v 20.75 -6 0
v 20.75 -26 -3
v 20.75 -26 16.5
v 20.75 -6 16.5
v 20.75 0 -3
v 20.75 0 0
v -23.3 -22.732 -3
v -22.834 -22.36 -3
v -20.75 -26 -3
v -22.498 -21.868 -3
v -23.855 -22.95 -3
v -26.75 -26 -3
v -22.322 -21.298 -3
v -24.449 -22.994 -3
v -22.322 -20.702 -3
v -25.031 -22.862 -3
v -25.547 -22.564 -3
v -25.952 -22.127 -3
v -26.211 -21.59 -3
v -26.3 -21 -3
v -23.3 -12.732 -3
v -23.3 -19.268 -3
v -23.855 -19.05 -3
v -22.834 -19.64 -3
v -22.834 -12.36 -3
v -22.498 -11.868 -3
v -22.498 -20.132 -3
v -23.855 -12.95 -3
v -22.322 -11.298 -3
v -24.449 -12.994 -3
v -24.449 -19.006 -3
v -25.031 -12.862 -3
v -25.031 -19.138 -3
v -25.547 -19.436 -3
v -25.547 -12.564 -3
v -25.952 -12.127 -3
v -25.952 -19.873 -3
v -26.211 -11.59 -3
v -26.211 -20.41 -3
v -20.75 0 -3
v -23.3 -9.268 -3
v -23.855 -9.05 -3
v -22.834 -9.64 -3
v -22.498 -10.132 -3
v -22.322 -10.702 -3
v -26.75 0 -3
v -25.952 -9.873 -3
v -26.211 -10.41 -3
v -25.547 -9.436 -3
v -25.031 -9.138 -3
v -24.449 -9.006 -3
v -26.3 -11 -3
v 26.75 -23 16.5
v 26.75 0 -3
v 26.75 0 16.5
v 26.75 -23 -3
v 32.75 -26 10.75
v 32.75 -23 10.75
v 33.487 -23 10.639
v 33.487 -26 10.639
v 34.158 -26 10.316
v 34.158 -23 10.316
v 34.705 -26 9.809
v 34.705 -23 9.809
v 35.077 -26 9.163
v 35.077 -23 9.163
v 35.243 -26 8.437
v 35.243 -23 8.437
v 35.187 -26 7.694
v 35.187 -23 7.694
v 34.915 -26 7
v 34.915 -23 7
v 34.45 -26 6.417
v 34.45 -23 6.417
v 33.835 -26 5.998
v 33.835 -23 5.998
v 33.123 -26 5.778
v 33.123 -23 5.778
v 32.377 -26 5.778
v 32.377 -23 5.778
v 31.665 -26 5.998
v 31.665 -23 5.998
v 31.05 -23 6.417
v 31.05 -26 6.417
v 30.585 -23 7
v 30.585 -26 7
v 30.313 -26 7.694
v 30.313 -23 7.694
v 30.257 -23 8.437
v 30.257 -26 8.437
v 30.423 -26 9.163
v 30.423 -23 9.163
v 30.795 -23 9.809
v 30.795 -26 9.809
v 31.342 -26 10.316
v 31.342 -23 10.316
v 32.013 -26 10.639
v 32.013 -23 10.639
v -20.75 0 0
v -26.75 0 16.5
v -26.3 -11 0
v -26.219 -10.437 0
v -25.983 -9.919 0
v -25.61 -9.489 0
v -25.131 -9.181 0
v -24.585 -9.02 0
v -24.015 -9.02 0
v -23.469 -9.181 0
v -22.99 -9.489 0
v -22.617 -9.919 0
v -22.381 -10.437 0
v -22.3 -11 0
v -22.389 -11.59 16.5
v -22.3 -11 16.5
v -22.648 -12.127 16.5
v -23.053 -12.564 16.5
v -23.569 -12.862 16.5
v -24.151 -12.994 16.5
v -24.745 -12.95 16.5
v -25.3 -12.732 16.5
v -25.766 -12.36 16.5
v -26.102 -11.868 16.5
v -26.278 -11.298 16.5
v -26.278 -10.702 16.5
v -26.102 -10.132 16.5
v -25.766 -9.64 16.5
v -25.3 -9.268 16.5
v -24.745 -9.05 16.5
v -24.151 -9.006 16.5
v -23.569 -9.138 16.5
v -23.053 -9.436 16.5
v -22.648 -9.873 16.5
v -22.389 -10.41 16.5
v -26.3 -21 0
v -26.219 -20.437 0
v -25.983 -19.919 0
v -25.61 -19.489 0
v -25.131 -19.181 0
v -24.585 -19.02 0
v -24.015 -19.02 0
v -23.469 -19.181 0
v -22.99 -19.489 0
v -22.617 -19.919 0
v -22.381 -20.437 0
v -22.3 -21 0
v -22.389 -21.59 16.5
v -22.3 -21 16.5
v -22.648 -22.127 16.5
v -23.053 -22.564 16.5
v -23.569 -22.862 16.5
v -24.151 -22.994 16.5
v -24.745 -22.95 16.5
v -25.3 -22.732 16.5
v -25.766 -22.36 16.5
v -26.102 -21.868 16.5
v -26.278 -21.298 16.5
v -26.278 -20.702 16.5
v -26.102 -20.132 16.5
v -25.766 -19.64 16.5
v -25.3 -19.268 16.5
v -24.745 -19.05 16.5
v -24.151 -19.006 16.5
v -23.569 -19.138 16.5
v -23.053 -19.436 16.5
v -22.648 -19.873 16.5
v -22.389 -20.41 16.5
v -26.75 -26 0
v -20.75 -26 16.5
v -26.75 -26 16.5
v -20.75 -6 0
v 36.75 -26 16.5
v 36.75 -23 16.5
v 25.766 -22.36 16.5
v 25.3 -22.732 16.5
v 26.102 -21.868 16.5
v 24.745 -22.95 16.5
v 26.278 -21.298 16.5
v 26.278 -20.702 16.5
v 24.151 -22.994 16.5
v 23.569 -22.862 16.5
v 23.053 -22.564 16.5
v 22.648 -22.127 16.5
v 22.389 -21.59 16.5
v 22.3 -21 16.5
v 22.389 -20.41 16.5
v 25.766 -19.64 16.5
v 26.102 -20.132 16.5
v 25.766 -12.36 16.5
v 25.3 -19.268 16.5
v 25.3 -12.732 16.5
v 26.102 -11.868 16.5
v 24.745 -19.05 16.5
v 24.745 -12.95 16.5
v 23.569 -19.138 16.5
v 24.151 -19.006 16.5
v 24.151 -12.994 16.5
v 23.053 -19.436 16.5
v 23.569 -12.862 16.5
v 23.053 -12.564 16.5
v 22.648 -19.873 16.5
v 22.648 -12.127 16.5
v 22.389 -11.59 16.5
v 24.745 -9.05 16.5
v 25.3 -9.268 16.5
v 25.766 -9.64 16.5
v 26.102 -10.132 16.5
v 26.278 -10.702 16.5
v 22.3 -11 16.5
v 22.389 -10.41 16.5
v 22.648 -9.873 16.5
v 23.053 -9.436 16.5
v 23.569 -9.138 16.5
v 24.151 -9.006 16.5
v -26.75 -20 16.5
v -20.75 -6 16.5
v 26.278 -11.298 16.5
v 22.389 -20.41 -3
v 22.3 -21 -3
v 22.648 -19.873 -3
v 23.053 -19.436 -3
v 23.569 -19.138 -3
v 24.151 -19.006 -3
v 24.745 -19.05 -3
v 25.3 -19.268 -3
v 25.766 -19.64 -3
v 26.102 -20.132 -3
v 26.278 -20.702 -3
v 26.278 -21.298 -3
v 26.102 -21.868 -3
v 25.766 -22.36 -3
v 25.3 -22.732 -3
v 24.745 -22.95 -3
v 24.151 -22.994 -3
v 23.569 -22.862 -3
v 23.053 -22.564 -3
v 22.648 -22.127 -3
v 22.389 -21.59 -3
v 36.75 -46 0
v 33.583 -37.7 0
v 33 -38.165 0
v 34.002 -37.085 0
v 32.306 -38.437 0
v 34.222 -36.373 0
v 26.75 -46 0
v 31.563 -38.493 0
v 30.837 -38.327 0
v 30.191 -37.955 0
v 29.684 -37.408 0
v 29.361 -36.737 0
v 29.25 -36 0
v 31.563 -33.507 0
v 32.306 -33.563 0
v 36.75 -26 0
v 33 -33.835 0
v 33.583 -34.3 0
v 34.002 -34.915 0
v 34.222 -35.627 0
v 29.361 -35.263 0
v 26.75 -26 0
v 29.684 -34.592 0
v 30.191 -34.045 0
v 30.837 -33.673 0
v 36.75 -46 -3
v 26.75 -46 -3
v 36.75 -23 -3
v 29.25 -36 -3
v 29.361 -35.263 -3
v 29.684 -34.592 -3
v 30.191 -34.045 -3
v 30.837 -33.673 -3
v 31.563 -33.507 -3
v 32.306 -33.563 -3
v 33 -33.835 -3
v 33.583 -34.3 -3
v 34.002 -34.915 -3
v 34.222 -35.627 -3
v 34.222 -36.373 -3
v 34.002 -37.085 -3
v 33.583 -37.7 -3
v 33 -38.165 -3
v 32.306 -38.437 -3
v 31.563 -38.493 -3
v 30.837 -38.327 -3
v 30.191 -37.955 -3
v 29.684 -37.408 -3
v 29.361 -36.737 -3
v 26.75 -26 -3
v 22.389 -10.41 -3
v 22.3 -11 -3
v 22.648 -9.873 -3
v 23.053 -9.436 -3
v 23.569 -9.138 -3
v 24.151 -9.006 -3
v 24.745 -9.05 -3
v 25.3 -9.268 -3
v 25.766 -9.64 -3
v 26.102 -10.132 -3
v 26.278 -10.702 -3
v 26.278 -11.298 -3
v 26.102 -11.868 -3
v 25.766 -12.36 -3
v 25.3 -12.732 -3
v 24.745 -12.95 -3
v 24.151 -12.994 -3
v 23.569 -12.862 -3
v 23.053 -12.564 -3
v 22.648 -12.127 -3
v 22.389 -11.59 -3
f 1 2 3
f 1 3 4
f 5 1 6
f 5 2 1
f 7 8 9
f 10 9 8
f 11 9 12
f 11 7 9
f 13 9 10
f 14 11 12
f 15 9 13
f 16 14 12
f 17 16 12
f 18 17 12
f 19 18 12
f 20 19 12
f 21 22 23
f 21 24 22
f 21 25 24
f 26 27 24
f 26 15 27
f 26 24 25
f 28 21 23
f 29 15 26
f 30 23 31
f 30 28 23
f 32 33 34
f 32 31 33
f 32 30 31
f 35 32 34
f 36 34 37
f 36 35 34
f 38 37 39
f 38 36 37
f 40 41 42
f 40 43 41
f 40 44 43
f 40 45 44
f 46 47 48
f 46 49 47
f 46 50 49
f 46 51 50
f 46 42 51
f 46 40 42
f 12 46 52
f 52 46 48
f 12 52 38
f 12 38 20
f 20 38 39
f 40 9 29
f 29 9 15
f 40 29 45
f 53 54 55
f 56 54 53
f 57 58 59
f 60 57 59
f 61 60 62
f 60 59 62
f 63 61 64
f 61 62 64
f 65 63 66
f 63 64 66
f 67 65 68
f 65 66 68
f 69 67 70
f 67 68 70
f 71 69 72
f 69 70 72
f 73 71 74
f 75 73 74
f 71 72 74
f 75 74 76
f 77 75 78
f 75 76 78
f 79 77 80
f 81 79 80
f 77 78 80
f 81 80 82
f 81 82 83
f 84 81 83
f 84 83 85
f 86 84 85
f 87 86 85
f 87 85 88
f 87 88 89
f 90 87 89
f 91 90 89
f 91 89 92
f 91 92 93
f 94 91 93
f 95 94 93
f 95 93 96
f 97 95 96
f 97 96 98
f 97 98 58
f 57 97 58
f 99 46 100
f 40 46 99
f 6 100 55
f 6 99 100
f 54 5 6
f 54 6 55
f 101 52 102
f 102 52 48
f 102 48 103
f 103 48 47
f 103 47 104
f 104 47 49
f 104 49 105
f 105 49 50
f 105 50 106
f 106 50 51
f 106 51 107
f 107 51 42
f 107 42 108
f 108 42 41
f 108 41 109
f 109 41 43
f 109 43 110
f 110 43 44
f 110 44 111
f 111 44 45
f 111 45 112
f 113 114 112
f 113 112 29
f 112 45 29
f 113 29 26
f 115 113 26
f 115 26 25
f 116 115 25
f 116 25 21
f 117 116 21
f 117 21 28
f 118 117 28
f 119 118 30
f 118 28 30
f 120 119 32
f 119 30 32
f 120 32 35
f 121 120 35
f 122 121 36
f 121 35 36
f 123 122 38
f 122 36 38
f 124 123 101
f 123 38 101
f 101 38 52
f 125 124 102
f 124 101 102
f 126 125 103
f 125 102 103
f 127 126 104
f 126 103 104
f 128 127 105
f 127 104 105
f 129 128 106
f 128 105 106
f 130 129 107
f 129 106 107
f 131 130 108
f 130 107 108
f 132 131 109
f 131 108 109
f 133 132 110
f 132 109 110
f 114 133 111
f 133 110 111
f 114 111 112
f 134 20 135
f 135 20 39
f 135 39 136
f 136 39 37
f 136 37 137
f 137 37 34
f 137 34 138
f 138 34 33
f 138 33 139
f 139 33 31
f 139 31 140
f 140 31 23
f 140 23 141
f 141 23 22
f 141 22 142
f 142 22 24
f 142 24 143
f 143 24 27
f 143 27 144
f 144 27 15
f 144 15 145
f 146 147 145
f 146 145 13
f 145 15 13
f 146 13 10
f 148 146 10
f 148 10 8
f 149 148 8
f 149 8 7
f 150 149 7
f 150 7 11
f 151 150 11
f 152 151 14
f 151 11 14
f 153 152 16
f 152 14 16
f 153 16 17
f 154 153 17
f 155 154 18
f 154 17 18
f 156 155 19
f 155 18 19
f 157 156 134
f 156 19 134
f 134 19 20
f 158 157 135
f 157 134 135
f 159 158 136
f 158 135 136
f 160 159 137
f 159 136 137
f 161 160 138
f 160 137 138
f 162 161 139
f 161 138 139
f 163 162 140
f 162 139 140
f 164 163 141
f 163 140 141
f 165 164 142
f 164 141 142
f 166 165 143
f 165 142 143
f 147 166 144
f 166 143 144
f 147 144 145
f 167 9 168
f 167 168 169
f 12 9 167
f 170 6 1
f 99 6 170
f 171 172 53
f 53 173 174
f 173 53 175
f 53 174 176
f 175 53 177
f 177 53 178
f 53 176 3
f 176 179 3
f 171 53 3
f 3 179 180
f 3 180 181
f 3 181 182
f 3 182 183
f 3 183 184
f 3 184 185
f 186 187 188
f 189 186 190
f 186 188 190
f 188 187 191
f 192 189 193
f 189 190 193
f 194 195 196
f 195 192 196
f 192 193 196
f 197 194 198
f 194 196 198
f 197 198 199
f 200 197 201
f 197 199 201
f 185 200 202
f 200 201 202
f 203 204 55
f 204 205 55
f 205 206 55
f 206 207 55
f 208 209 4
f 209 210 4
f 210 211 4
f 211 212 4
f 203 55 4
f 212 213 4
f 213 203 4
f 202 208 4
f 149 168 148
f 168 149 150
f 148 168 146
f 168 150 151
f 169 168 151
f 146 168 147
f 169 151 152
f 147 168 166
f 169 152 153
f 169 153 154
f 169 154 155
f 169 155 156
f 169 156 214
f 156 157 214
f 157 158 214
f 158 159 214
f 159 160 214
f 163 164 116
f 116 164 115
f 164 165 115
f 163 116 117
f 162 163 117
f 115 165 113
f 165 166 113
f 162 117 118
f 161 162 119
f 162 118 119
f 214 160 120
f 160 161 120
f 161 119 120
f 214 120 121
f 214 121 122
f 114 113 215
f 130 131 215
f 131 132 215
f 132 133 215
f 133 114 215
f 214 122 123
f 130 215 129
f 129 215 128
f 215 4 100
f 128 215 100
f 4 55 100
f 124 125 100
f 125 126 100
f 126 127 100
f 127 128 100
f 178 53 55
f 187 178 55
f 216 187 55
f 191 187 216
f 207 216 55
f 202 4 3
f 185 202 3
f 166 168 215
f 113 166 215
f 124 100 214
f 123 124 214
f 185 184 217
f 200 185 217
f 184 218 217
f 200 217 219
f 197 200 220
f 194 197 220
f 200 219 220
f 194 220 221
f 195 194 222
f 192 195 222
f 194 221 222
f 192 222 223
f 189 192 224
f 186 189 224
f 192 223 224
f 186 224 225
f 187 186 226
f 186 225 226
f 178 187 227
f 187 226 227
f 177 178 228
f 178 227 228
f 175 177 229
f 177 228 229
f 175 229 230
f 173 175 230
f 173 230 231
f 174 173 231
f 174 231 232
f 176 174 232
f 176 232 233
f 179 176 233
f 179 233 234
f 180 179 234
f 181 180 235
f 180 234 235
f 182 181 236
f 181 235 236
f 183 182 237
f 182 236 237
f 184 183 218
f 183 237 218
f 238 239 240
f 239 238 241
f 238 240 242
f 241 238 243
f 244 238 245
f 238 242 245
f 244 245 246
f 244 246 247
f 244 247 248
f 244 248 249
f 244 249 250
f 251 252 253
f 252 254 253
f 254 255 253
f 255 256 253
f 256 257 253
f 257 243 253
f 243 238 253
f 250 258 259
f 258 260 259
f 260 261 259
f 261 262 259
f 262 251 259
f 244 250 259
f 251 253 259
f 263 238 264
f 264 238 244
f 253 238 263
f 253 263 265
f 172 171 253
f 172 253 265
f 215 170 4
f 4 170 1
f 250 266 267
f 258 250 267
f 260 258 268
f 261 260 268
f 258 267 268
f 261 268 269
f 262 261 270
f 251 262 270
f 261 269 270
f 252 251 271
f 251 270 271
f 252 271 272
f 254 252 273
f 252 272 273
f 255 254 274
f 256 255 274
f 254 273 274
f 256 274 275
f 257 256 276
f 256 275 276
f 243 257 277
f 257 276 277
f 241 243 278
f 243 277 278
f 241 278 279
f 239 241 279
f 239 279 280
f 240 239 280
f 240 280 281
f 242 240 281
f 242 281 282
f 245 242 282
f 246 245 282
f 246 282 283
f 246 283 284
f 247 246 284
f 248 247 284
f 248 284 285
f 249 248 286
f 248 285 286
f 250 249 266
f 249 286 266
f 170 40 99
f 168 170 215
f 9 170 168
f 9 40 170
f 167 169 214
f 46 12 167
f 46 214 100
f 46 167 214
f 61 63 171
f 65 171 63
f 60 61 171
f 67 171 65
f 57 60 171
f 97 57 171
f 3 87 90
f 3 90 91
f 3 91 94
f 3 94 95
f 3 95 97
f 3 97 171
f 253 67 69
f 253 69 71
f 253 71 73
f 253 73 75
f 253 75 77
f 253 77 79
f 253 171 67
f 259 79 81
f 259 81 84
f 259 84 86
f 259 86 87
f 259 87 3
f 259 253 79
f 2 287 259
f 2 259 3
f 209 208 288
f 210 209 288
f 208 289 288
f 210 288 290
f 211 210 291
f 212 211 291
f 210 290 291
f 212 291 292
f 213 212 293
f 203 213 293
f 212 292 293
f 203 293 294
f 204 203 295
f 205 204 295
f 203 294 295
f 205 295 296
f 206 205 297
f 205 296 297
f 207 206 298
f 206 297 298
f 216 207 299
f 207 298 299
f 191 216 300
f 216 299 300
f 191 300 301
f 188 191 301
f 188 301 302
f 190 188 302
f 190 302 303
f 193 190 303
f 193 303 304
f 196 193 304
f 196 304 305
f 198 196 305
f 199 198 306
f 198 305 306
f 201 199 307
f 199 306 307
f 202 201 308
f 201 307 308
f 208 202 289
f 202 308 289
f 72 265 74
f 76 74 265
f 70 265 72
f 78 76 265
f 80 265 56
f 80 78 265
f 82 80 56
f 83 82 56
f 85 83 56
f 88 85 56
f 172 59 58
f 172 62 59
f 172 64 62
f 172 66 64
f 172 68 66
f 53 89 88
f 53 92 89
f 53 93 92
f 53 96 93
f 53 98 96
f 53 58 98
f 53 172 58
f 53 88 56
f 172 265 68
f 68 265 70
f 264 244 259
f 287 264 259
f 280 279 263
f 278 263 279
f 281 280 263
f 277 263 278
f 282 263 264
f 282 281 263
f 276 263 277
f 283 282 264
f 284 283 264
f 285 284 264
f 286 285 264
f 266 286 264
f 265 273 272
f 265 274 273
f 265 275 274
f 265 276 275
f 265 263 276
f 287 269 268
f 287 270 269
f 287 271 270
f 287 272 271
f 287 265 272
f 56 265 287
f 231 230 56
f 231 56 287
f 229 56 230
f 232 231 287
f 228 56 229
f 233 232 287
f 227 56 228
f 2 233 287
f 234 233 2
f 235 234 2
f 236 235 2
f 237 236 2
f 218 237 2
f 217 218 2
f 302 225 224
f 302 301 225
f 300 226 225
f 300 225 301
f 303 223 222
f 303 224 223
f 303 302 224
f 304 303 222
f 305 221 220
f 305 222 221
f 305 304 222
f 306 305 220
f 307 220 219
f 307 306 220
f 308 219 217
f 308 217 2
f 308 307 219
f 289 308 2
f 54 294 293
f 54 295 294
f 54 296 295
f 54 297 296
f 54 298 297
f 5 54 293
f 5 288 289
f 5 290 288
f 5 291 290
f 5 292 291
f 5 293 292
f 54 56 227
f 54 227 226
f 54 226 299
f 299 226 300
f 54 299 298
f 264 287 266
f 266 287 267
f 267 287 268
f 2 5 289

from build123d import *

# Parameters (mm, degrees)
EXTRUDE_1_DEPTH     = 16.5
SKETCH_2_R          = 2.5
CUT_EXTRUDE_1_DEPTH = 16.5
SKETCH_3_W          = 10
SKETCH_3_H          = 16.5
CUT_EXTRUDE_2_DEPTH = 3
SKETCH_4_W          = 11.896315449
SKETCH_4_H          = 29.084641161
CUT_EXTRUDE_3_DEPTH = 48.945933091
SKETCH_5_R          = 2
CUT_EXTRUDE_4_DEPTH = 48.945933091
SKETCH_6_W          = 10
SKETCH_6_H          = 23
EXTRUDE_2_DEPTH     = 3
SKETCH_7_R          = 2.5
CUT_EXTRUDE_5_DEPTH = 3
EXTRUDE_START       = 3
SKETCH_8_R          = 2
SKETCH_8_W          = 6
SKETCH_8_H          = 26
EXTRUDE_3_DEPTH     = 3
SKETCH_9_R          = 2.5
CUT_EXTRUDE_6_DEPTH = 3
SKETCH_10_W         = 10
SKETCH_10_H         = 20
CUT_EXTRUDE_7_DEPTH = 10


with BuildPart() as part:
    # 草图1 → 凸台-拉伸1 (new body)
    with BuildSketch(Plane.XY):
        Polygon((0, 0), (26.75, 0), (26.75, -20), (36.75, -20), (36.75, -26), (20.75, -26), (20.75, -6), (0, -6), (-20.75, -6), (-20.75, -26), (-36.75, -26), (-36.75, -20), (-26.75, -20), (-26.75, 0), align=None)
    extrude(amount=EXTRUDE_1_DEPTH)

    # 草图2 → 切除-拉伸1 (cut)
    with BuildSketch(Plane(origin=(0, -20, 0), x_dir=(1, 0, 0), z_dir=(0, 1, 0))):
        with Locations((32.75, -8.25)):
            Circle(SKETCH_2_R)
    extrude(amount=-CUT_EXTRUDE_1_DEPTH, mode=Mode.SUBTRACT)

    # 草图3 → 切除-拉伸2 (cut)
    with BuildSketch(Plane(origin=(0, -20, 0), x_dir=(1, 0, 0), z_dir=(0, 1, 0))):
        with Locations((31.75, -8.25)):
            Rectangle(SKETCH_3_W, SKETCH_3_H)
    extrude(amount=-CUT_EXTRUDE_2_DEPTH, mode=Mode.SUBTRACT)

    # 草图4 → 切除-拉伸3 (cut, through all)
    with BuildSketch(Plane.XY.offset(16.5)):
        with Locations((-32.698157724, -14.542320581)):
            Rectangle(SKETCH_4_W, SKETCH_4_H)
    extrude(amount=-CUT_EXTRUDE_3_DEPTH, mode=Mode.SUBTRACT)

    # 草图5 → 切除-拉伸4 (cut, through all)
    with BuildSketch(Plane(origin=(0, 0, 0), x_dir=(-1, 0, 0), z_dir=(0, 0, -1))):
        with Locations((-24.3, -11)):
            Circle(SKETCH_5_R)
        with Locations((-24.3, -21)):
            Circle(SKETCH_5_R)
        with Locations((24.3, -21)):
            Circle(SKETCH_5_R)
        with Locations((24.3, -11)):
            Circle(SKETCH_5_R)
    extrude(amount=-CUT_EXTRUDE_4_DEPTH, mode=Mode.SUBTRACT)

    # 草图6 → 凸台-拉伸2 (add)
    with BuildSketch(Plane(origin=(0, 0, 0), x_dir=(-1, 0, 0), z_dir=(0, 0, -1))):
        with Locations((-31.75, -34.5)):
            Rectangle(SKETCH_6_W, SKETCH_6_H)
    extrude(amount=EXTRUDE_2_DEPTH)

    # 草图7 → 切除-拉伸5 (cut)
    with BuildSketch(Plane(origin=(0, 0, -3), x_dir=(-1, 0, 0), z_dir=(0, 0, -1))):
        with Locations((-31.75, -36)):
            Circle(SKETCH_7_R)
    extrude(amount=-CUT_EXTRUDE_5_DEPTH, mode=Mode.SUBTRACT)

    # 草图8 → 凸台-拉伸3 (add)
    # profile 1 of 2: a face of its own
    with BuildSketch(Plane(origin=(0, 0, 0), x_dir=(-1, 0, 0), z_dir=(0, 0, -1)).offset(EXTRUDE_START)):
        Polygon((26.75, 0), (20.75, 0), (20.75, -46), (26.75, -46), (30.75, -46), (30.75, -26), (26.75, -26), align=None)
        with Locations((24.3, -21)):
            Circle(SKETCH_8_R, mode=Mode.SUBTRACT)
        with Locations((24.3, -11)):
            Circle(SKETCH_8_R, mode=Mode.SUBTRACT)
    # profile 2 of 2: a face of its own
    with BuildSketch(Plane(origin=(0, 0, 0), x_dir=(-1, 0, 0), z_dir=(0, 0, -1)).offset(EXTRUDE_START)):
        with Locations((-23.75, -13)):
            Rectangle(SKETCH_8_W, SKETCH_8_H)
        with Locations((-24.3, -11)):
            Circle(SKETCH_8_R, mode=Mode.SUBTRACT)
        with Locations((-24.3, -21)):
            Circle(SKETCH_8_R, mode=Mode.SUBTRACT)
    extrude(amount=-EXTRUDE_3_DEPTH)

    # 草图9 → 切除-拉伸6 (cut)
    with BuildSketch(Plane(origin=(0, 0, -3), x_dir=(-1, 0, 0), z_dir=(0, 0, -1))):
        with Locations((25.75, -36)):
            Circle(SKETCH_9_R)
    extrude(amount=-CUT_EXTRUDE_6_DEPTH, mode=Mode.SUBTRACT)

    # 草图10 → 切除-拉伸7 (cut)
    with BuildSketch(Plane(origin=(0, 0, -3), x_dir=(-1, 0, 0), z_dir=(0, 0, -1))):
        with Locations((25.75, -36)):
            Rectangle(SKETCH_10_W, SKETCH_10_H)
    extrude(amount=-CUT_EXTRUDE_7_DEPTH, mode=Mode.SUBTRACT)


solid = part.part
